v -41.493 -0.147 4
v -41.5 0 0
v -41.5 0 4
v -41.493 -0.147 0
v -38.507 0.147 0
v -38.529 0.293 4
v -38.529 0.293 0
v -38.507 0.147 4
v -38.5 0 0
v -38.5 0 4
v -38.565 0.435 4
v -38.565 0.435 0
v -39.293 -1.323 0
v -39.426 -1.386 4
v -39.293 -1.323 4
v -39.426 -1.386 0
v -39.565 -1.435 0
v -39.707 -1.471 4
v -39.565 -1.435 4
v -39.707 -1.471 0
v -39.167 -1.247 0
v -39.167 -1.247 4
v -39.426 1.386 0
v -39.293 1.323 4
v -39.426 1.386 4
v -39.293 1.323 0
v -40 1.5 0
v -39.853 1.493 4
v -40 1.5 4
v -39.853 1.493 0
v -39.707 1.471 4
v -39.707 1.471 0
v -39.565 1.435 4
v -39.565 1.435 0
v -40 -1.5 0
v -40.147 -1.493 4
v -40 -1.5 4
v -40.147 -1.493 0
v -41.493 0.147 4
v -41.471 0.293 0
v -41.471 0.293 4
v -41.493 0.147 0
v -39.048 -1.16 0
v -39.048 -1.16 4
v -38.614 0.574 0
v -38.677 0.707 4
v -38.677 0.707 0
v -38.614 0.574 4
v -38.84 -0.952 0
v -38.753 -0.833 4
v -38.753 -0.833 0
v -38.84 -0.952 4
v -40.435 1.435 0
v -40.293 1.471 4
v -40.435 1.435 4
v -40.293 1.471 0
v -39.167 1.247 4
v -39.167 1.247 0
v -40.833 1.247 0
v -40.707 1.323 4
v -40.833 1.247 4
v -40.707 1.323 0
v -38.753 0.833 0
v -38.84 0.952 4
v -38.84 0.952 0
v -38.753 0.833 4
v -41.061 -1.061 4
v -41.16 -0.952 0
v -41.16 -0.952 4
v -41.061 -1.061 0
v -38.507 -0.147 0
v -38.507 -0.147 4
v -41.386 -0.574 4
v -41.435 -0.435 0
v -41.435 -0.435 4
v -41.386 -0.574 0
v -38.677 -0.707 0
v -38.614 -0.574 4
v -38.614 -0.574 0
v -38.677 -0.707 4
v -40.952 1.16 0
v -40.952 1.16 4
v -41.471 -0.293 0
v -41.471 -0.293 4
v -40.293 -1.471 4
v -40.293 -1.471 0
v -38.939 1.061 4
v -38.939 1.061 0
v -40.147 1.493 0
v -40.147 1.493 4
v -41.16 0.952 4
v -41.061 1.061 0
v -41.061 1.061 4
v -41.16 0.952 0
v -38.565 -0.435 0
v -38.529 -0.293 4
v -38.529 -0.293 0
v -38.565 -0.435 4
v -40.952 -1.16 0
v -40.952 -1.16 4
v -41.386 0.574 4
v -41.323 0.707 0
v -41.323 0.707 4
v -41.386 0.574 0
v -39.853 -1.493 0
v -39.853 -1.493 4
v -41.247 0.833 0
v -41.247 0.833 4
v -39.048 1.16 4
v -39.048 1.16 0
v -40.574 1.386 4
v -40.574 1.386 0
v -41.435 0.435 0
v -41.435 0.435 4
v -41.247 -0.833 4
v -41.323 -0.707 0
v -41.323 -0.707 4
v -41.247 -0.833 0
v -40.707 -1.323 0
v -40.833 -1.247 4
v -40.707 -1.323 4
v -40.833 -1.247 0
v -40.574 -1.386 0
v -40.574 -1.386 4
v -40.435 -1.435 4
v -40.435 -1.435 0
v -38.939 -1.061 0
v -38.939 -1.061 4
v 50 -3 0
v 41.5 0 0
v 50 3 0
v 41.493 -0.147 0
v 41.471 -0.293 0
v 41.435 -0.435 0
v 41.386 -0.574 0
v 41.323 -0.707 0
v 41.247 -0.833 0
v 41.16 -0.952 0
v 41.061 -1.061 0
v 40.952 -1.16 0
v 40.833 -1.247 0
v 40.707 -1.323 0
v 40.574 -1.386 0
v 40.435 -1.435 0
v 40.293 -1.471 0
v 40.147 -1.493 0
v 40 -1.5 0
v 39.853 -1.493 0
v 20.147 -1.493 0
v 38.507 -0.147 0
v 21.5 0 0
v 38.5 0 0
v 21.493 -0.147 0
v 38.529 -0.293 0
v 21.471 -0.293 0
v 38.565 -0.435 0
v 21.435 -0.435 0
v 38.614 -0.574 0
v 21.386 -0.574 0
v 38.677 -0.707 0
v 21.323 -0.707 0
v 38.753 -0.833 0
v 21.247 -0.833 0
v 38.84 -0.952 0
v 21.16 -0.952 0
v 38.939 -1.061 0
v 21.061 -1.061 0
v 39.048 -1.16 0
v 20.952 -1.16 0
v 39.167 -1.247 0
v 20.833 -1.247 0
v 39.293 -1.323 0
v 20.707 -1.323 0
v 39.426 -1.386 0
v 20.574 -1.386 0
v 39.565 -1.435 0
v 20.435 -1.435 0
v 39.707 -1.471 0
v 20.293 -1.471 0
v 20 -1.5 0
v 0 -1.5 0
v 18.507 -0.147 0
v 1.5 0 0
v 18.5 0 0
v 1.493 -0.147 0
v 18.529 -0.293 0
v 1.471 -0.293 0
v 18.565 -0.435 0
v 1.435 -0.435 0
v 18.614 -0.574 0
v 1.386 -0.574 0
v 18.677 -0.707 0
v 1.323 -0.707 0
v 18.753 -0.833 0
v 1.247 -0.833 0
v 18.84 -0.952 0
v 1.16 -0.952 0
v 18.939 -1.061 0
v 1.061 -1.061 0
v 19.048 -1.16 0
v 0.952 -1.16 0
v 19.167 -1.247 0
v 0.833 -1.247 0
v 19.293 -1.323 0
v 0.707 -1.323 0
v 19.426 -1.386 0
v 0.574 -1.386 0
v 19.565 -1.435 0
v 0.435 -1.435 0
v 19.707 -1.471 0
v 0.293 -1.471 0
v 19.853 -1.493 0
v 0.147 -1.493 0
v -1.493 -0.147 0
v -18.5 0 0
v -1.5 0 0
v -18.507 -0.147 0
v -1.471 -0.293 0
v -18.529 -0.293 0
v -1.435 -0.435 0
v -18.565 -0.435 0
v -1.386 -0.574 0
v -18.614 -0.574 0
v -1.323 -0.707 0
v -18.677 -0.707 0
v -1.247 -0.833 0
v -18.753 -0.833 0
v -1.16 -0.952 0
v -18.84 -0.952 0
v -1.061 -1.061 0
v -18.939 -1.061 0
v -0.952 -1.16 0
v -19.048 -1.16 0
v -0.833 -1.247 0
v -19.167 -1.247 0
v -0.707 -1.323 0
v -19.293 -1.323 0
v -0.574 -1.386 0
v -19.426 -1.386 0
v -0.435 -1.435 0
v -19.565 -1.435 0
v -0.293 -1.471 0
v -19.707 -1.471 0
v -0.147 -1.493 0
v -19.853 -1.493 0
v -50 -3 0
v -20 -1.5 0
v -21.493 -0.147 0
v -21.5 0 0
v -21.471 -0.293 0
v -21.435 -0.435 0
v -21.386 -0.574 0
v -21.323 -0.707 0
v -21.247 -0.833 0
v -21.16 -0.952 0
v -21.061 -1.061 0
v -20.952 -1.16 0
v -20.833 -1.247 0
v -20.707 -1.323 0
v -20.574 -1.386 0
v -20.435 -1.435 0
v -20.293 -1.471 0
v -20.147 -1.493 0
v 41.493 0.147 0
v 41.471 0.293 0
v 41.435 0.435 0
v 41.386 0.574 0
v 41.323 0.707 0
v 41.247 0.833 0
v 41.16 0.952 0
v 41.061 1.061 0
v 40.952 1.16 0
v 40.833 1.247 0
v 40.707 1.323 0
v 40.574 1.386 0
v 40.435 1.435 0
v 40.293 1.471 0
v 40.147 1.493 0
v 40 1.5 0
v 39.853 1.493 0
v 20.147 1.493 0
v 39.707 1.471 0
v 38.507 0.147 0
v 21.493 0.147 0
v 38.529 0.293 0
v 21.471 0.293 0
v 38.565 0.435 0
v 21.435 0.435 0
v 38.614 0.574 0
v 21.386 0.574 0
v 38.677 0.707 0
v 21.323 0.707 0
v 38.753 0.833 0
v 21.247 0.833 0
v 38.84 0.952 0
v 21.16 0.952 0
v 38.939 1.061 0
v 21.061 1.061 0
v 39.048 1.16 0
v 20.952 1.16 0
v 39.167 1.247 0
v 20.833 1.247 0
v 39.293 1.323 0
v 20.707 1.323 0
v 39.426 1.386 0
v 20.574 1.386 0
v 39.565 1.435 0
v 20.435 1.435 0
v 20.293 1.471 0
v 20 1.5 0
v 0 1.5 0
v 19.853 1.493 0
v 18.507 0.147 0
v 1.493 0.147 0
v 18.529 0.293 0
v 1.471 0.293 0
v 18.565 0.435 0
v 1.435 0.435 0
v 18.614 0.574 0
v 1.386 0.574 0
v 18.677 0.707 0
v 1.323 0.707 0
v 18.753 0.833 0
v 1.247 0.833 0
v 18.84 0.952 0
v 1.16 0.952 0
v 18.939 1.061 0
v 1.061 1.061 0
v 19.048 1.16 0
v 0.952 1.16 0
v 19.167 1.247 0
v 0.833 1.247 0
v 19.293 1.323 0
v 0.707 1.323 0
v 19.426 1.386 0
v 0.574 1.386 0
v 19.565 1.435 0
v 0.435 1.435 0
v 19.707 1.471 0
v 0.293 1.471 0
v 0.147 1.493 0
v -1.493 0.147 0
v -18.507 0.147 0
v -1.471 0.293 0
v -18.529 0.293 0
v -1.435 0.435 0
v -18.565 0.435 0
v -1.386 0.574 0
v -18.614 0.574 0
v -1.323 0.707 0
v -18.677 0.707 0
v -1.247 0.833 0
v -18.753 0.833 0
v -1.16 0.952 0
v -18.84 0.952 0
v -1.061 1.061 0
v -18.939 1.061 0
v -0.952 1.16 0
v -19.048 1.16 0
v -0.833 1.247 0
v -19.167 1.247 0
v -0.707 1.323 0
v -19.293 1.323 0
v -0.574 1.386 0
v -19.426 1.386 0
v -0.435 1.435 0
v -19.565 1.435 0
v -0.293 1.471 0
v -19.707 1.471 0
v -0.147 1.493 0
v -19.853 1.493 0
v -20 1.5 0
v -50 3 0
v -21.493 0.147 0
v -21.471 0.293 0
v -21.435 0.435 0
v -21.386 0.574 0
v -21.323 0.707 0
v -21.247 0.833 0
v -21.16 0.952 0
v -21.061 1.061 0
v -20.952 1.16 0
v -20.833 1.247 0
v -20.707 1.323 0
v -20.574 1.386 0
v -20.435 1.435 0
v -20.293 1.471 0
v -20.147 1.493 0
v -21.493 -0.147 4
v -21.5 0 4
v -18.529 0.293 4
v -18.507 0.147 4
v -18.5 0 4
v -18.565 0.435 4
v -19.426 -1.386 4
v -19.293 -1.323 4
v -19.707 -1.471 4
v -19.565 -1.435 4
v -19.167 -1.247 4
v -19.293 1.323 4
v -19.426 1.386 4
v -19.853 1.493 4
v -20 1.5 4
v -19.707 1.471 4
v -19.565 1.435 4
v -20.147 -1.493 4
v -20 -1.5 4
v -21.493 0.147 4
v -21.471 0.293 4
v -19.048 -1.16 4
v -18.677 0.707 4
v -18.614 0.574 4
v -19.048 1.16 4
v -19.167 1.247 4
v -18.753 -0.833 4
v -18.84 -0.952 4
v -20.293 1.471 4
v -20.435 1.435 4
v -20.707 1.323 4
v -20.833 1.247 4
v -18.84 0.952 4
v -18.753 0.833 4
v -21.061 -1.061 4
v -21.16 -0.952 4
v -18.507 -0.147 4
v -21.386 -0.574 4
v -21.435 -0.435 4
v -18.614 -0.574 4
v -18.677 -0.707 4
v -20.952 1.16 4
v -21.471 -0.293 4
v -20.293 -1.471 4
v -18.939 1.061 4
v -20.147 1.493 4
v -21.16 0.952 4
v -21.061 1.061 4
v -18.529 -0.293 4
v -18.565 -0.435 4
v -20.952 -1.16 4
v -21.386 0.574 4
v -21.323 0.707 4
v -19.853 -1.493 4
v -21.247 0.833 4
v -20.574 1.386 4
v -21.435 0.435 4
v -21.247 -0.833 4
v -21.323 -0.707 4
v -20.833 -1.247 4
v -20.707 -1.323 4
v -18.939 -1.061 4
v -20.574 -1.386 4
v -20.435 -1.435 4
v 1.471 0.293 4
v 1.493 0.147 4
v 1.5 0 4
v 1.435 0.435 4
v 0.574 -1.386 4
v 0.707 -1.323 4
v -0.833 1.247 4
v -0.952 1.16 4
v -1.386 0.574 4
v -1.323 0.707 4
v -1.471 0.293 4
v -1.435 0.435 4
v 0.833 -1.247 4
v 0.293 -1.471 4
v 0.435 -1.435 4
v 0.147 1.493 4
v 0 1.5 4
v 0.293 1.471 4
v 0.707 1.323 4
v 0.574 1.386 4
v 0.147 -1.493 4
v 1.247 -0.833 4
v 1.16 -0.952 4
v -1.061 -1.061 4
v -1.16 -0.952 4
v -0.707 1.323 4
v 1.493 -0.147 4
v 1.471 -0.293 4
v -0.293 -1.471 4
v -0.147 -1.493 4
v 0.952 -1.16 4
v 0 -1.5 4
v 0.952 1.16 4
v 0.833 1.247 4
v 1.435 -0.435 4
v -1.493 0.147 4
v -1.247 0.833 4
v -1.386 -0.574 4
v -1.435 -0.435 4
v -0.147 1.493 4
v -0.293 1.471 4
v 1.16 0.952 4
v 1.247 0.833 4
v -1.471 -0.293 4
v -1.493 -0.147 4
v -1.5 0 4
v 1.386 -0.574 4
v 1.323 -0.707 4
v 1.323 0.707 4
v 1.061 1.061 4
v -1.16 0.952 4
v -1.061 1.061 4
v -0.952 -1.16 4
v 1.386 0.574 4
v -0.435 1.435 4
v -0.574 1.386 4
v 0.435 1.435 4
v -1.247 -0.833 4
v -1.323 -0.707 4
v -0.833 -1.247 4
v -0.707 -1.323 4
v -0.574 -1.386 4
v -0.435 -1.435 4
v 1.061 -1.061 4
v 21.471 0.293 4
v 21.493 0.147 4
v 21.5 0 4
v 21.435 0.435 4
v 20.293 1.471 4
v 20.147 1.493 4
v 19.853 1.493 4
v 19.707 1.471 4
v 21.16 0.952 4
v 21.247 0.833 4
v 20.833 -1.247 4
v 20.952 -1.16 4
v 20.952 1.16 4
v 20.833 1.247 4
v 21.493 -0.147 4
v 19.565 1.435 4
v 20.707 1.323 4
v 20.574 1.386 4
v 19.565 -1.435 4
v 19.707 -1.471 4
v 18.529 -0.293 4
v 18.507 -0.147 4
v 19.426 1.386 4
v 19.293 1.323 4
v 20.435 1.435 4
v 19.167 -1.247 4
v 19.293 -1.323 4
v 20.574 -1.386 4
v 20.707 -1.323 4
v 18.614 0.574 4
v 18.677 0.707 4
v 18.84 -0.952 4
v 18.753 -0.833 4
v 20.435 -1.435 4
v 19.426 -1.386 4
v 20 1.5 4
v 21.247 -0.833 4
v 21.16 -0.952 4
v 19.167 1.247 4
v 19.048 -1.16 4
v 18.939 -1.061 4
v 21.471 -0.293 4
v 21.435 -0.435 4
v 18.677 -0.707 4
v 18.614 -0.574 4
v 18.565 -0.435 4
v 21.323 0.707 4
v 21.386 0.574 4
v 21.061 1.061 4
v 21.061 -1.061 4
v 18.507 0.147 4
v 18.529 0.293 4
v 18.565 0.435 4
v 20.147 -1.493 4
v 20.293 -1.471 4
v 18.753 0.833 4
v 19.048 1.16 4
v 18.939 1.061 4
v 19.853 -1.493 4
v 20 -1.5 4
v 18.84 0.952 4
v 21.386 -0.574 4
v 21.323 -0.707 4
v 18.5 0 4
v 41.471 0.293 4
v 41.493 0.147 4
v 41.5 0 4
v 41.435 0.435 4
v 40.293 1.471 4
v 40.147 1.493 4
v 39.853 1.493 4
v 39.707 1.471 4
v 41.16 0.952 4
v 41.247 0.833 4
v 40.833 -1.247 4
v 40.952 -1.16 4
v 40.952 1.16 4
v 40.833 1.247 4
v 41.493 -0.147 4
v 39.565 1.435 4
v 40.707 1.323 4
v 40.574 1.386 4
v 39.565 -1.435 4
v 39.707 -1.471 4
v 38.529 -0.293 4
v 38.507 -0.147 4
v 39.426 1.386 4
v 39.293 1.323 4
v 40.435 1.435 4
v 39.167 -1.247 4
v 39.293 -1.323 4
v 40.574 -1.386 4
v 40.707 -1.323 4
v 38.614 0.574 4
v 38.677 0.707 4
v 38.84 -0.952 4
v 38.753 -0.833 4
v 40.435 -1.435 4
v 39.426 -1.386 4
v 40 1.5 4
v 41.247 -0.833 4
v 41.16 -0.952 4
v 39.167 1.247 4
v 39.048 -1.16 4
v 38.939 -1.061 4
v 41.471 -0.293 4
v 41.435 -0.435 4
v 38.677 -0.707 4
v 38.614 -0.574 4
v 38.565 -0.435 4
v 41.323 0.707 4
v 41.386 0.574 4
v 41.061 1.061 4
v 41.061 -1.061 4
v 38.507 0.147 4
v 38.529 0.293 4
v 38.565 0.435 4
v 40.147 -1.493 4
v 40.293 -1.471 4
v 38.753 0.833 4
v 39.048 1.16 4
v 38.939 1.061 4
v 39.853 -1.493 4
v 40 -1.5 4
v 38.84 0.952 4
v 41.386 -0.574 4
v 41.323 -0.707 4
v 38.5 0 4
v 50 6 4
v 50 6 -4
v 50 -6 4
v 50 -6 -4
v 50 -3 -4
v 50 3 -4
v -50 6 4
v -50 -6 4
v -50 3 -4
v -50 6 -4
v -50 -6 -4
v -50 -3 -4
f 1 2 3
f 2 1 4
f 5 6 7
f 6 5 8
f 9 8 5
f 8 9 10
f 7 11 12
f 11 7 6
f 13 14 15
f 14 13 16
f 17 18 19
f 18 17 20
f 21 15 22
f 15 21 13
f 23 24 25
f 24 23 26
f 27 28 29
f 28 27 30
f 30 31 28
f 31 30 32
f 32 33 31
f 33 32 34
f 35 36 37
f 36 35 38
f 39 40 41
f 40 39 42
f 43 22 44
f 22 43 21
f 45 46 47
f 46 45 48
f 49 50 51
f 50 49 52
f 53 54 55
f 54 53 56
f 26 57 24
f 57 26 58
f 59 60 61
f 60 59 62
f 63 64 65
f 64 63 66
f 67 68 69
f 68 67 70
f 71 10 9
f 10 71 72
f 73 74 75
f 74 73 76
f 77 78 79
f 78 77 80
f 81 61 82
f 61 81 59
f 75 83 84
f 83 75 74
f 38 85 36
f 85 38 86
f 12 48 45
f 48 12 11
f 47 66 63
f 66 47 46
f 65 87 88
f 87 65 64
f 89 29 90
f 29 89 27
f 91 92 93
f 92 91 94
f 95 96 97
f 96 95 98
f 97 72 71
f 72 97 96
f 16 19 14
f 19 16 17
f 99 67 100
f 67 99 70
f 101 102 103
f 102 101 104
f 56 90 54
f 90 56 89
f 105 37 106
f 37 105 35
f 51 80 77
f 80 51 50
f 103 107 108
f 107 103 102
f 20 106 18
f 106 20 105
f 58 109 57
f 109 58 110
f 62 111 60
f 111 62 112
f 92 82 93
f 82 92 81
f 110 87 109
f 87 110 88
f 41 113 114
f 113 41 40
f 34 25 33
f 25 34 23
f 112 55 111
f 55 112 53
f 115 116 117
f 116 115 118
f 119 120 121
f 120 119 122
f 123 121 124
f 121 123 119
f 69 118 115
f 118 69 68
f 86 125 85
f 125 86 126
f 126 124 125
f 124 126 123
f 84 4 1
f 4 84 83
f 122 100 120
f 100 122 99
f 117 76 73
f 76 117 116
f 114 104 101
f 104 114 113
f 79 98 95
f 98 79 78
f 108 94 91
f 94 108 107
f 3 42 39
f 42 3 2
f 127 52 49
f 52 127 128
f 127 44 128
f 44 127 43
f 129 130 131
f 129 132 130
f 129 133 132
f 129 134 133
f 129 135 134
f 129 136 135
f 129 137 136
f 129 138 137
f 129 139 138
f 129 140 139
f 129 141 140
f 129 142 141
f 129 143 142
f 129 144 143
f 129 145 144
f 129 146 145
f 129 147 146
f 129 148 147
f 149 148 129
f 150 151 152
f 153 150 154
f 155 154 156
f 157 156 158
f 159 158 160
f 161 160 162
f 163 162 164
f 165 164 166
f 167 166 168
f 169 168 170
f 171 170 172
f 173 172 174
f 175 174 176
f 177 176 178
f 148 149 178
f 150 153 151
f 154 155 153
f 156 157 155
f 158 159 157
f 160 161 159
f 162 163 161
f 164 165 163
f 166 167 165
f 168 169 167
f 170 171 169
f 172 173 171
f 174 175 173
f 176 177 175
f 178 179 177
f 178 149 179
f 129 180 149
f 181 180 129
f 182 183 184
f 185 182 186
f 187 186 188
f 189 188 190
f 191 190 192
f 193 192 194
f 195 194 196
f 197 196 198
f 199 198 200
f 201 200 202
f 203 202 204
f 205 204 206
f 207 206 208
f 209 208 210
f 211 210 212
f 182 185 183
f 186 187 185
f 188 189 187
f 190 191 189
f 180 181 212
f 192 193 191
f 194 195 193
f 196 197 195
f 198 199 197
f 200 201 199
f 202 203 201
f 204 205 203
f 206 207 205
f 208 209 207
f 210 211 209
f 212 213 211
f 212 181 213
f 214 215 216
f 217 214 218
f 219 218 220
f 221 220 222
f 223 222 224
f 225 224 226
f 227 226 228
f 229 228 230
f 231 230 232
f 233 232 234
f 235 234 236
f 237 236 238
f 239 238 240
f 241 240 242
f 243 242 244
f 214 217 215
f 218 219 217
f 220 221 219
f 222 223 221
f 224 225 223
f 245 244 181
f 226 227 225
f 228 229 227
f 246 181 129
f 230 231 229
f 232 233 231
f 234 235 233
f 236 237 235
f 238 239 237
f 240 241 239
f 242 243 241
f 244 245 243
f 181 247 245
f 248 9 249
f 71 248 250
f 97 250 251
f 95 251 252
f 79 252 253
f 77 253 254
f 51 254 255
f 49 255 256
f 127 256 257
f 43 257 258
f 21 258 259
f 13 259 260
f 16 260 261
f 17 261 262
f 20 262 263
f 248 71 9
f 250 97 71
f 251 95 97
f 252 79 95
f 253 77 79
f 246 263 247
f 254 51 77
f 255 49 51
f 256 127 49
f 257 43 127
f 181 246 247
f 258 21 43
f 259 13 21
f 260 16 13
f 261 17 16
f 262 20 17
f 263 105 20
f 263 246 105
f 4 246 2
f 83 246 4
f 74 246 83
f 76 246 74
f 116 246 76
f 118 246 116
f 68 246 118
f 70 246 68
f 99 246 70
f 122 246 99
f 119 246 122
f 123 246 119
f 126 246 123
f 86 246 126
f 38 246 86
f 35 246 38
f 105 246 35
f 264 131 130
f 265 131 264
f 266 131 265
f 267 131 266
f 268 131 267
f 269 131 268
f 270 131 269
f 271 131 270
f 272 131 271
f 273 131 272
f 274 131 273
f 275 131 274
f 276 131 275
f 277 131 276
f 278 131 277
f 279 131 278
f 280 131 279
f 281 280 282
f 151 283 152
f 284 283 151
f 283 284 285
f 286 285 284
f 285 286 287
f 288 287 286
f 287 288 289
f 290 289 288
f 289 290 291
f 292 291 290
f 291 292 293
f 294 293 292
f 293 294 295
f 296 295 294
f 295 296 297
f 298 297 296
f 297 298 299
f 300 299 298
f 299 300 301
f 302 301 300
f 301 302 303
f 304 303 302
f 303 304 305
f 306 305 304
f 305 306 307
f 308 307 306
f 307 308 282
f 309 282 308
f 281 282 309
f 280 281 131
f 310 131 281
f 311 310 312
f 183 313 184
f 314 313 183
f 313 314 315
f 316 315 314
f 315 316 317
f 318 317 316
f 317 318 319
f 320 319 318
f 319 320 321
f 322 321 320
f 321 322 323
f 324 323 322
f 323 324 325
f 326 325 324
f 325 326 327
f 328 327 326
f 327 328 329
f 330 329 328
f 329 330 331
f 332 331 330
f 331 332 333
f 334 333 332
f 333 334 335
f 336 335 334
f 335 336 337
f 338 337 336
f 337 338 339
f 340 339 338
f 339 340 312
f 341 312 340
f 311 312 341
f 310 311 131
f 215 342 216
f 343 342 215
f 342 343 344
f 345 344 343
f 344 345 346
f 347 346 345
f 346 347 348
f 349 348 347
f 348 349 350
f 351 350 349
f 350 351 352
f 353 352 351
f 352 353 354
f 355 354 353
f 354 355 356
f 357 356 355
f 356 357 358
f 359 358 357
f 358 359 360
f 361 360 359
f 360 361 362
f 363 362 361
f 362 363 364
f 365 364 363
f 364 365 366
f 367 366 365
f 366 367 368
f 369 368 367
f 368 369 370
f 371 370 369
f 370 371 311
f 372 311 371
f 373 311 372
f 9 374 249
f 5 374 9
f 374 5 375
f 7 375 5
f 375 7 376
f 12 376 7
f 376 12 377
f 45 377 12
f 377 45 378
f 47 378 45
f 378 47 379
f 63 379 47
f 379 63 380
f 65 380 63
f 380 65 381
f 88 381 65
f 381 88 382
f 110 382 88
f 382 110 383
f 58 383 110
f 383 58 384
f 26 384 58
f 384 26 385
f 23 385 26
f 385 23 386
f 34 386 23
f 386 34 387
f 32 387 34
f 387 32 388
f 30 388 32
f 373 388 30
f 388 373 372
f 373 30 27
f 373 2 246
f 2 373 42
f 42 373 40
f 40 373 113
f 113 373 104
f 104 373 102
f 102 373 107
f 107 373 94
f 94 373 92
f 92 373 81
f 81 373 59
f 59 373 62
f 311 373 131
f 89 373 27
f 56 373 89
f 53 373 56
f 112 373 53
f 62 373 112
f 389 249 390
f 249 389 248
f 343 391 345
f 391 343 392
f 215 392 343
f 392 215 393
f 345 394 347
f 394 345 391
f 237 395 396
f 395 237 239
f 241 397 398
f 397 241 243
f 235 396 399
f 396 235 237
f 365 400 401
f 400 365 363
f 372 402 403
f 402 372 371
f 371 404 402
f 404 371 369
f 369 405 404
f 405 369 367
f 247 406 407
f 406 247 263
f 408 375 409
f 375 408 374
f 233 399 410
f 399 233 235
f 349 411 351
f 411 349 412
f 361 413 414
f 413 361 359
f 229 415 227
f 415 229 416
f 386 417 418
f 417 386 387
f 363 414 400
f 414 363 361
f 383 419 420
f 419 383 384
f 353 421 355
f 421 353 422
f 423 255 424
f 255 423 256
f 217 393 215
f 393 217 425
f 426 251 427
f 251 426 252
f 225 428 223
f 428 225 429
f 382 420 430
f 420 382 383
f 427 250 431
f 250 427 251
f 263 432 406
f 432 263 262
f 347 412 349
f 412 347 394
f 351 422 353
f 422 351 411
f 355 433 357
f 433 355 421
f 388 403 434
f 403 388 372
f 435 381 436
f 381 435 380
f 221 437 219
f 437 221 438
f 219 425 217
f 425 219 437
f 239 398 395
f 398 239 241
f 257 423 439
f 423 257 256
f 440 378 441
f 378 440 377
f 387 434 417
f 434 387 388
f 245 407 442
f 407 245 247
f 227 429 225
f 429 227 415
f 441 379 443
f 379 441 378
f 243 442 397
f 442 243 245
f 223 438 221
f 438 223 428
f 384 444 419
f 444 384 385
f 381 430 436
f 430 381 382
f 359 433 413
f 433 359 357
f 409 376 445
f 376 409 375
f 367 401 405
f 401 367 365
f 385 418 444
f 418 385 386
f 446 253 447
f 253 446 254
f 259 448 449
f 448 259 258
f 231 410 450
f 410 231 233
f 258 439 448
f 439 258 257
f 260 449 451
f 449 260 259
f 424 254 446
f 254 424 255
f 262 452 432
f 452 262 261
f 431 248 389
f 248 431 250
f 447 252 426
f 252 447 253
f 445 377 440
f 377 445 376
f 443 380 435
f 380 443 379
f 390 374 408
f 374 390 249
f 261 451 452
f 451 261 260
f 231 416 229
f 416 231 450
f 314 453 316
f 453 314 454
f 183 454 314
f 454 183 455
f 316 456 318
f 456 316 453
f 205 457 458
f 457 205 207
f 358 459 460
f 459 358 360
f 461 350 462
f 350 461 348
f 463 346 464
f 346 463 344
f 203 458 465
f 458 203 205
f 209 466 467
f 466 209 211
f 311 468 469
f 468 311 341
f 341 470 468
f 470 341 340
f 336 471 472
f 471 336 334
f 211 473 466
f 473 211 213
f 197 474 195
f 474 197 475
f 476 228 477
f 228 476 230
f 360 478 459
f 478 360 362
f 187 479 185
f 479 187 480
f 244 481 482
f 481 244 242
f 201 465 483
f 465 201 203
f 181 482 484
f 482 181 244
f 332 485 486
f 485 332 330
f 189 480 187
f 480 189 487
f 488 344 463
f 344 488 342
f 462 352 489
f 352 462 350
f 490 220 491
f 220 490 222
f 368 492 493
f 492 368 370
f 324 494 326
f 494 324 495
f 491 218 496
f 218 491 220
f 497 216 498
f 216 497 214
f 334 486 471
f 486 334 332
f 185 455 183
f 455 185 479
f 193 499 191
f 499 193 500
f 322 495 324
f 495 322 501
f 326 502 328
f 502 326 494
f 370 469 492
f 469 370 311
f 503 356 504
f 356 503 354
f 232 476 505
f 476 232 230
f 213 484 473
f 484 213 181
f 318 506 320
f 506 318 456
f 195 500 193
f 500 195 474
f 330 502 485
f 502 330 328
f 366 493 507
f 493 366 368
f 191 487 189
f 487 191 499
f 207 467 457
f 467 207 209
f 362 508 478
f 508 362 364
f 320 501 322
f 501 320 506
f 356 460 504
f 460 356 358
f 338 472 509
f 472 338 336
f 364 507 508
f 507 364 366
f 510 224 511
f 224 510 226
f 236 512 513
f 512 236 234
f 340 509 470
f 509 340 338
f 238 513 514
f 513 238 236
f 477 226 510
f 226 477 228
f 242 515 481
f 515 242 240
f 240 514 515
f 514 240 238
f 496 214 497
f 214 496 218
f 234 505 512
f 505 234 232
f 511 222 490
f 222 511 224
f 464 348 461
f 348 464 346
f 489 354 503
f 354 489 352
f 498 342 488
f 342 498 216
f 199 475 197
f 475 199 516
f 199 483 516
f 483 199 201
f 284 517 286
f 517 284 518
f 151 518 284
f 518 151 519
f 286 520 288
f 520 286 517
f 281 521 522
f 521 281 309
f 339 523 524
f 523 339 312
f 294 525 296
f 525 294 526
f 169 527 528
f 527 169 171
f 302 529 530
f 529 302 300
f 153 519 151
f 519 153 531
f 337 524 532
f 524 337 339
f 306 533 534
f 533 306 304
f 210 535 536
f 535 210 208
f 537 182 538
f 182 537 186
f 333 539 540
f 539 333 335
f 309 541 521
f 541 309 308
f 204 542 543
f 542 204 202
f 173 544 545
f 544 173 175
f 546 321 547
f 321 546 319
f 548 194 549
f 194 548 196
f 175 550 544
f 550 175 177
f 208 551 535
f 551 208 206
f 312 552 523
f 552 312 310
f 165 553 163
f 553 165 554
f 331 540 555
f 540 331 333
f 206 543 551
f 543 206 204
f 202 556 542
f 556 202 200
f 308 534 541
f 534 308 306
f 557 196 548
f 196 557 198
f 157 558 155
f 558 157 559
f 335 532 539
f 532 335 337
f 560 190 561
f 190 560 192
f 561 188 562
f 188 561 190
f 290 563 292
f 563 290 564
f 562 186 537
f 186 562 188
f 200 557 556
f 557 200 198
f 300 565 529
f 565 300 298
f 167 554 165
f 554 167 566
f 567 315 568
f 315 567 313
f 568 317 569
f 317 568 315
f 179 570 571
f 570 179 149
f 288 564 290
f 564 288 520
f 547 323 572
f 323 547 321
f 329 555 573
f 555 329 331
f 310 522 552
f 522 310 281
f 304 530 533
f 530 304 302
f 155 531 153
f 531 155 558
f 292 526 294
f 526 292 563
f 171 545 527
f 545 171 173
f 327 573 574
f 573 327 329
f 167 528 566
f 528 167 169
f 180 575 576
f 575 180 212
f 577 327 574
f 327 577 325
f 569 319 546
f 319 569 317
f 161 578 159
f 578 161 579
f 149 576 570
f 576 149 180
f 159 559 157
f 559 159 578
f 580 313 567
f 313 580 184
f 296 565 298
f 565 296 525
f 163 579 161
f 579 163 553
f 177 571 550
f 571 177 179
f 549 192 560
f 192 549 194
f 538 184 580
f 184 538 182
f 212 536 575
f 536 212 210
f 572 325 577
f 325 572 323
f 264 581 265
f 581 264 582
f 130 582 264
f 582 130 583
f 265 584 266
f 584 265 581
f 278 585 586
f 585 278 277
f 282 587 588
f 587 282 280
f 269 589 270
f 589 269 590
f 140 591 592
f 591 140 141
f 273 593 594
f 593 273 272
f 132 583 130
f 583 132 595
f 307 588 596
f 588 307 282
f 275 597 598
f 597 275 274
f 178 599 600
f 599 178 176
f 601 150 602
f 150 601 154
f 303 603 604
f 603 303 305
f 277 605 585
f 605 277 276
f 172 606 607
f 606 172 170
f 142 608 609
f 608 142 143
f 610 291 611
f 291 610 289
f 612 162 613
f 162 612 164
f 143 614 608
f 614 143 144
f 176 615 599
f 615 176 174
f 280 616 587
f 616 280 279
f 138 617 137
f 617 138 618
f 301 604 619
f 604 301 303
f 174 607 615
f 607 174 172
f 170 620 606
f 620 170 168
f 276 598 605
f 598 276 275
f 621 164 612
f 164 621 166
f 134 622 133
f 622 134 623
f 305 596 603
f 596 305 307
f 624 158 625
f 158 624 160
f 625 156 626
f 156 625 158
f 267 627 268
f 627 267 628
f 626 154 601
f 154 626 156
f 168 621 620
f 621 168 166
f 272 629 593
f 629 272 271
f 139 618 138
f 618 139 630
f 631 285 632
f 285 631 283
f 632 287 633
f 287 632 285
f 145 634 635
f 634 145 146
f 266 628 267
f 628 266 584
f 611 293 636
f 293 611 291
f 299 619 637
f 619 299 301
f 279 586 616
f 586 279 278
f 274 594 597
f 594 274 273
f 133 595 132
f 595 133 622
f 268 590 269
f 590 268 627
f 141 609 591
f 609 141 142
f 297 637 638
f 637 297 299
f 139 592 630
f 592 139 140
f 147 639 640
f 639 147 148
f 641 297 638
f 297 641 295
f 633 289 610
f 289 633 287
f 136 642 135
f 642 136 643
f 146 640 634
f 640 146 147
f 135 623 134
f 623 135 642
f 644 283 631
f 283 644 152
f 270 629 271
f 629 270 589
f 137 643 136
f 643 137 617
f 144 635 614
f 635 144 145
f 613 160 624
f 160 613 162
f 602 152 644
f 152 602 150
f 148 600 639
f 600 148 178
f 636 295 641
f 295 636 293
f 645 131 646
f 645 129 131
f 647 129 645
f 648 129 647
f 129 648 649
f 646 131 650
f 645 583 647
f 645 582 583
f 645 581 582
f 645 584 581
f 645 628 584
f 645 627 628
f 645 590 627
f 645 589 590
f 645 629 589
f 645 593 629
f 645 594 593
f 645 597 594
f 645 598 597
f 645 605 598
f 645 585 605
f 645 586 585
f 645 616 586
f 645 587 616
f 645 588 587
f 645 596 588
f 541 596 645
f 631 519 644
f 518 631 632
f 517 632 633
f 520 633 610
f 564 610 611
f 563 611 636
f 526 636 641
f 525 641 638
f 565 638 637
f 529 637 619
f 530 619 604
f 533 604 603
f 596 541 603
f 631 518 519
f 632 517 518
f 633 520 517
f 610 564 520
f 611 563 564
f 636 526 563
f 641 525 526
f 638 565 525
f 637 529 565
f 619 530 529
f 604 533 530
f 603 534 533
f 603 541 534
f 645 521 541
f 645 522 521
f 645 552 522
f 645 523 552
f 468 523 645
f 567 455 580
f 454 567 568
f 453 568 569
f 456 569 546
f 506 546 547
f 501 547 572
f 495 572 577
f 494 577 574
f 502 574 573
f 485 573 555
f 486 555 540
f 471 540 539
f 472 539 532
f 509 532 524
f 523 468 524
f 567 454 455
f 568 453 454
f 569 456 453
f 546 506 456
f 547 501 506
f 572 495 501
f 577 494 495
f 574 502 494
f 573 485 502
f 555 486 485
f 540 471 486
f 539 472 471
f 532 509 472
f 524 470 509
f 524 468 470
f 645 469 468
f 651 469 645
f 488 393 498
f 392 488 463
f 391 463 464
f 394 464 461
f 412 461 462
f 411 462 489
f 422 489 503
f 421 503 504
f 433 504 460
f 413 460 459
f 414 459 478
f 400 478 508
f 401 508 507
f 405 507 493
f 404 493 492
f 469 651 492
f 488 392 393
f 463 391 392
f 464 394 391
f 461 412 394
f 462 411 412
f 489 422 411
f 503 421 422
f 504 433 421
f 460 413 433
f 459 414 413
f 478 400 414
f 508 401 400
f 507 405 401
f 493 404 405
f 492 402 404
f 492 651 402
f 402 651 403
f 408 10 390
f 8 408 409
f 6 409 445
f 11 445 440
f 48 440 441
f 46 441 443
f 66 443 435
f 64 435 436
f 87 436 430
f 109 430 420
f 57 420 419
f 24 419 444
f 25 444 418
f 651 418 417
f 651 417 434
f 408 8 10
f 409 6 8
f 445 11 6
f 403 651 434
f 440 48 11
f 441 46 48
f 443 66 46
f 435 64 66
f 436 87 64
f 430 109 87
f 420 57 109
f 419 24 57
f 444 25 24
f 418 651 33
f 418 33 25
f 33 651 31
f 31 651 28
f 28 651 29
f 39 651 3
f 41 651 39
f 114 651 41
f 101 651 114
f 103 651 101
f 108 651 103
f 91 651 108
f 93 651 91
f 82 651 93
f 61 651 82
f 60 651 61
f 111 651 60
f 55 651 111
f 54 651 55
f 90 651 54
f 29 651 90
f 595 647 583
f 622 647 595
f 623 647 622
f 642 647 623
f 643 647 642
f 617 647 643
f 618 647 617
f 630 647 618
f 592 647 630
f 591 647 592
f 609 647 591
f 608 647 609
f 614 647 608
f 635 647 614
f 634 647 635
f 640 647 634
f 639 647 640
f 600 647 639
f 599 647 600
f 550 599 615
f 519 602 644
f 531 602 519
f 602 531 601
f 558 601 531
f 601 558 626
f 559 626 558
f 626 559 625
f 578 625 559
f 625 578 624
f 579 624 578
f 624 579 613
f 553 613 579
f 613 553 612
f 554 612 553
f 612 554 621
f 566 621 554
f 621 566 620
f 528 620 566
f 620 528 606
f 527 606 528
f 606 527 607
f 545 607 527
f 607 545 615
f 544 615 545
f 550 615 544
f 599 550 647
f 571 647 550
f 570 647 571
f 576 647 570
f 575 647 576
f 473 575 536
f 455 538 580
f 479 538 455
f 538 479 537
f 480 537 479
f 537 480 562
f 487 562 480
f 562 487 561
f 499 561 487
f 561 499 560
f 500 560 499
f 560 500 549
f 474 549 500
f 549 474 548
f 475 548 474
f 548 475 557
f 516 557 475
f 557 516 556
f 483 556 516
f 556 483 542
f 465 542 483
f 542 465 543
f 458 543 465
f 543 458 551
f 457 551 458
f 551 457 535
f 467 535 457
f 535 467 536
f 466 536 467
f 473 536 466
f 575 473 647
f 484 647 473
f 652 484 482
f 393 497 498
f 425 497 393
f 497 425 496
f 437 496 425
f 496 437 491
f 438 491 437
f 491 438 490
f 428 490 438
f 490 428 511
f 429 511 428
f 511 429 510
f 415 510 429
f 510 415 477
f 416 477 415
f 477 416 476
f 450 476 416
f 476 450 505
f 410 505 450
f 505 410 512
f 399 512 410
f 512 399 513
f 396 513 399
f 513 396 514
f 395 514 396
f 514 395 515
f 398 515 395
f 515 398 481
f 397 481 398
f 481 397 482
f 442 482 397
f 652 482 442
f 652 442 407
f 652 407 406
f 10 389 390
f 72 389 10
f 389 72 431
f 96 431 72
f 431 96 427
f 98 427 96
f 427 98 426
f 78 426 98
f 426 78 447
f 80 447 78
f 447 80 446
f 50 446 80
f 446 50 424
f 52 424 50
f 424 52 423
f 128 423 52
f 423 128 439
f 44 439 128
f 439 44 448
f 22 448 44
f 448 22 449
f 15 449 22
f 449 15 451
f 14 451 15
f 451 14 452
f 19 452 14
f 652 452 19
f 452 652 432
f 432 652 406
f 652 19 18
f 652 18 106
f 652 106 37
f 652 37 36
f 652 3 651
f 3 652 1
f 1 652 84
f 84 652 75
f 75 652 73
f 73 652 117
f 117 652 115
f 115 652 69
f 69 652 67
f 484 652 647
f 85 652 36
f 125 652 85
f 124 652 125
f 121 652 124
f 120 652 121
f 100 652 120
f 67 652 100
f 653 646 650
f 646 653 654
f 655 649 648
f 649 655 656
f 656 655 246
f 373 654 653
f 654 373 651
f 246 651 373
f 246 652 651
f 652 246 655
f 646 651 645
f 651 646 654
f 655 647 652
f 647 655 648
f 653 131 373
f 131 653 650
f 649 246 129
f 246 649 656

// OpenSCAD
module linear_guide_rail() {
    difference() {
        // Main body of the rail
        translate([-50, -6, -4])
            cube([100, 12, 8]);
        
        // Cutout for the rail groove
        translate([-50, -3, -4])
            cube([100, 6, 4]);
        
        // Holes for mounting
        for (x = [-40, -20, 0, 20, 40]) {
            translate([x, 0, 0])
                cylinder(h=8, r=1.5, $fn=64);
        }
    }
}

linear_guide_rail();
